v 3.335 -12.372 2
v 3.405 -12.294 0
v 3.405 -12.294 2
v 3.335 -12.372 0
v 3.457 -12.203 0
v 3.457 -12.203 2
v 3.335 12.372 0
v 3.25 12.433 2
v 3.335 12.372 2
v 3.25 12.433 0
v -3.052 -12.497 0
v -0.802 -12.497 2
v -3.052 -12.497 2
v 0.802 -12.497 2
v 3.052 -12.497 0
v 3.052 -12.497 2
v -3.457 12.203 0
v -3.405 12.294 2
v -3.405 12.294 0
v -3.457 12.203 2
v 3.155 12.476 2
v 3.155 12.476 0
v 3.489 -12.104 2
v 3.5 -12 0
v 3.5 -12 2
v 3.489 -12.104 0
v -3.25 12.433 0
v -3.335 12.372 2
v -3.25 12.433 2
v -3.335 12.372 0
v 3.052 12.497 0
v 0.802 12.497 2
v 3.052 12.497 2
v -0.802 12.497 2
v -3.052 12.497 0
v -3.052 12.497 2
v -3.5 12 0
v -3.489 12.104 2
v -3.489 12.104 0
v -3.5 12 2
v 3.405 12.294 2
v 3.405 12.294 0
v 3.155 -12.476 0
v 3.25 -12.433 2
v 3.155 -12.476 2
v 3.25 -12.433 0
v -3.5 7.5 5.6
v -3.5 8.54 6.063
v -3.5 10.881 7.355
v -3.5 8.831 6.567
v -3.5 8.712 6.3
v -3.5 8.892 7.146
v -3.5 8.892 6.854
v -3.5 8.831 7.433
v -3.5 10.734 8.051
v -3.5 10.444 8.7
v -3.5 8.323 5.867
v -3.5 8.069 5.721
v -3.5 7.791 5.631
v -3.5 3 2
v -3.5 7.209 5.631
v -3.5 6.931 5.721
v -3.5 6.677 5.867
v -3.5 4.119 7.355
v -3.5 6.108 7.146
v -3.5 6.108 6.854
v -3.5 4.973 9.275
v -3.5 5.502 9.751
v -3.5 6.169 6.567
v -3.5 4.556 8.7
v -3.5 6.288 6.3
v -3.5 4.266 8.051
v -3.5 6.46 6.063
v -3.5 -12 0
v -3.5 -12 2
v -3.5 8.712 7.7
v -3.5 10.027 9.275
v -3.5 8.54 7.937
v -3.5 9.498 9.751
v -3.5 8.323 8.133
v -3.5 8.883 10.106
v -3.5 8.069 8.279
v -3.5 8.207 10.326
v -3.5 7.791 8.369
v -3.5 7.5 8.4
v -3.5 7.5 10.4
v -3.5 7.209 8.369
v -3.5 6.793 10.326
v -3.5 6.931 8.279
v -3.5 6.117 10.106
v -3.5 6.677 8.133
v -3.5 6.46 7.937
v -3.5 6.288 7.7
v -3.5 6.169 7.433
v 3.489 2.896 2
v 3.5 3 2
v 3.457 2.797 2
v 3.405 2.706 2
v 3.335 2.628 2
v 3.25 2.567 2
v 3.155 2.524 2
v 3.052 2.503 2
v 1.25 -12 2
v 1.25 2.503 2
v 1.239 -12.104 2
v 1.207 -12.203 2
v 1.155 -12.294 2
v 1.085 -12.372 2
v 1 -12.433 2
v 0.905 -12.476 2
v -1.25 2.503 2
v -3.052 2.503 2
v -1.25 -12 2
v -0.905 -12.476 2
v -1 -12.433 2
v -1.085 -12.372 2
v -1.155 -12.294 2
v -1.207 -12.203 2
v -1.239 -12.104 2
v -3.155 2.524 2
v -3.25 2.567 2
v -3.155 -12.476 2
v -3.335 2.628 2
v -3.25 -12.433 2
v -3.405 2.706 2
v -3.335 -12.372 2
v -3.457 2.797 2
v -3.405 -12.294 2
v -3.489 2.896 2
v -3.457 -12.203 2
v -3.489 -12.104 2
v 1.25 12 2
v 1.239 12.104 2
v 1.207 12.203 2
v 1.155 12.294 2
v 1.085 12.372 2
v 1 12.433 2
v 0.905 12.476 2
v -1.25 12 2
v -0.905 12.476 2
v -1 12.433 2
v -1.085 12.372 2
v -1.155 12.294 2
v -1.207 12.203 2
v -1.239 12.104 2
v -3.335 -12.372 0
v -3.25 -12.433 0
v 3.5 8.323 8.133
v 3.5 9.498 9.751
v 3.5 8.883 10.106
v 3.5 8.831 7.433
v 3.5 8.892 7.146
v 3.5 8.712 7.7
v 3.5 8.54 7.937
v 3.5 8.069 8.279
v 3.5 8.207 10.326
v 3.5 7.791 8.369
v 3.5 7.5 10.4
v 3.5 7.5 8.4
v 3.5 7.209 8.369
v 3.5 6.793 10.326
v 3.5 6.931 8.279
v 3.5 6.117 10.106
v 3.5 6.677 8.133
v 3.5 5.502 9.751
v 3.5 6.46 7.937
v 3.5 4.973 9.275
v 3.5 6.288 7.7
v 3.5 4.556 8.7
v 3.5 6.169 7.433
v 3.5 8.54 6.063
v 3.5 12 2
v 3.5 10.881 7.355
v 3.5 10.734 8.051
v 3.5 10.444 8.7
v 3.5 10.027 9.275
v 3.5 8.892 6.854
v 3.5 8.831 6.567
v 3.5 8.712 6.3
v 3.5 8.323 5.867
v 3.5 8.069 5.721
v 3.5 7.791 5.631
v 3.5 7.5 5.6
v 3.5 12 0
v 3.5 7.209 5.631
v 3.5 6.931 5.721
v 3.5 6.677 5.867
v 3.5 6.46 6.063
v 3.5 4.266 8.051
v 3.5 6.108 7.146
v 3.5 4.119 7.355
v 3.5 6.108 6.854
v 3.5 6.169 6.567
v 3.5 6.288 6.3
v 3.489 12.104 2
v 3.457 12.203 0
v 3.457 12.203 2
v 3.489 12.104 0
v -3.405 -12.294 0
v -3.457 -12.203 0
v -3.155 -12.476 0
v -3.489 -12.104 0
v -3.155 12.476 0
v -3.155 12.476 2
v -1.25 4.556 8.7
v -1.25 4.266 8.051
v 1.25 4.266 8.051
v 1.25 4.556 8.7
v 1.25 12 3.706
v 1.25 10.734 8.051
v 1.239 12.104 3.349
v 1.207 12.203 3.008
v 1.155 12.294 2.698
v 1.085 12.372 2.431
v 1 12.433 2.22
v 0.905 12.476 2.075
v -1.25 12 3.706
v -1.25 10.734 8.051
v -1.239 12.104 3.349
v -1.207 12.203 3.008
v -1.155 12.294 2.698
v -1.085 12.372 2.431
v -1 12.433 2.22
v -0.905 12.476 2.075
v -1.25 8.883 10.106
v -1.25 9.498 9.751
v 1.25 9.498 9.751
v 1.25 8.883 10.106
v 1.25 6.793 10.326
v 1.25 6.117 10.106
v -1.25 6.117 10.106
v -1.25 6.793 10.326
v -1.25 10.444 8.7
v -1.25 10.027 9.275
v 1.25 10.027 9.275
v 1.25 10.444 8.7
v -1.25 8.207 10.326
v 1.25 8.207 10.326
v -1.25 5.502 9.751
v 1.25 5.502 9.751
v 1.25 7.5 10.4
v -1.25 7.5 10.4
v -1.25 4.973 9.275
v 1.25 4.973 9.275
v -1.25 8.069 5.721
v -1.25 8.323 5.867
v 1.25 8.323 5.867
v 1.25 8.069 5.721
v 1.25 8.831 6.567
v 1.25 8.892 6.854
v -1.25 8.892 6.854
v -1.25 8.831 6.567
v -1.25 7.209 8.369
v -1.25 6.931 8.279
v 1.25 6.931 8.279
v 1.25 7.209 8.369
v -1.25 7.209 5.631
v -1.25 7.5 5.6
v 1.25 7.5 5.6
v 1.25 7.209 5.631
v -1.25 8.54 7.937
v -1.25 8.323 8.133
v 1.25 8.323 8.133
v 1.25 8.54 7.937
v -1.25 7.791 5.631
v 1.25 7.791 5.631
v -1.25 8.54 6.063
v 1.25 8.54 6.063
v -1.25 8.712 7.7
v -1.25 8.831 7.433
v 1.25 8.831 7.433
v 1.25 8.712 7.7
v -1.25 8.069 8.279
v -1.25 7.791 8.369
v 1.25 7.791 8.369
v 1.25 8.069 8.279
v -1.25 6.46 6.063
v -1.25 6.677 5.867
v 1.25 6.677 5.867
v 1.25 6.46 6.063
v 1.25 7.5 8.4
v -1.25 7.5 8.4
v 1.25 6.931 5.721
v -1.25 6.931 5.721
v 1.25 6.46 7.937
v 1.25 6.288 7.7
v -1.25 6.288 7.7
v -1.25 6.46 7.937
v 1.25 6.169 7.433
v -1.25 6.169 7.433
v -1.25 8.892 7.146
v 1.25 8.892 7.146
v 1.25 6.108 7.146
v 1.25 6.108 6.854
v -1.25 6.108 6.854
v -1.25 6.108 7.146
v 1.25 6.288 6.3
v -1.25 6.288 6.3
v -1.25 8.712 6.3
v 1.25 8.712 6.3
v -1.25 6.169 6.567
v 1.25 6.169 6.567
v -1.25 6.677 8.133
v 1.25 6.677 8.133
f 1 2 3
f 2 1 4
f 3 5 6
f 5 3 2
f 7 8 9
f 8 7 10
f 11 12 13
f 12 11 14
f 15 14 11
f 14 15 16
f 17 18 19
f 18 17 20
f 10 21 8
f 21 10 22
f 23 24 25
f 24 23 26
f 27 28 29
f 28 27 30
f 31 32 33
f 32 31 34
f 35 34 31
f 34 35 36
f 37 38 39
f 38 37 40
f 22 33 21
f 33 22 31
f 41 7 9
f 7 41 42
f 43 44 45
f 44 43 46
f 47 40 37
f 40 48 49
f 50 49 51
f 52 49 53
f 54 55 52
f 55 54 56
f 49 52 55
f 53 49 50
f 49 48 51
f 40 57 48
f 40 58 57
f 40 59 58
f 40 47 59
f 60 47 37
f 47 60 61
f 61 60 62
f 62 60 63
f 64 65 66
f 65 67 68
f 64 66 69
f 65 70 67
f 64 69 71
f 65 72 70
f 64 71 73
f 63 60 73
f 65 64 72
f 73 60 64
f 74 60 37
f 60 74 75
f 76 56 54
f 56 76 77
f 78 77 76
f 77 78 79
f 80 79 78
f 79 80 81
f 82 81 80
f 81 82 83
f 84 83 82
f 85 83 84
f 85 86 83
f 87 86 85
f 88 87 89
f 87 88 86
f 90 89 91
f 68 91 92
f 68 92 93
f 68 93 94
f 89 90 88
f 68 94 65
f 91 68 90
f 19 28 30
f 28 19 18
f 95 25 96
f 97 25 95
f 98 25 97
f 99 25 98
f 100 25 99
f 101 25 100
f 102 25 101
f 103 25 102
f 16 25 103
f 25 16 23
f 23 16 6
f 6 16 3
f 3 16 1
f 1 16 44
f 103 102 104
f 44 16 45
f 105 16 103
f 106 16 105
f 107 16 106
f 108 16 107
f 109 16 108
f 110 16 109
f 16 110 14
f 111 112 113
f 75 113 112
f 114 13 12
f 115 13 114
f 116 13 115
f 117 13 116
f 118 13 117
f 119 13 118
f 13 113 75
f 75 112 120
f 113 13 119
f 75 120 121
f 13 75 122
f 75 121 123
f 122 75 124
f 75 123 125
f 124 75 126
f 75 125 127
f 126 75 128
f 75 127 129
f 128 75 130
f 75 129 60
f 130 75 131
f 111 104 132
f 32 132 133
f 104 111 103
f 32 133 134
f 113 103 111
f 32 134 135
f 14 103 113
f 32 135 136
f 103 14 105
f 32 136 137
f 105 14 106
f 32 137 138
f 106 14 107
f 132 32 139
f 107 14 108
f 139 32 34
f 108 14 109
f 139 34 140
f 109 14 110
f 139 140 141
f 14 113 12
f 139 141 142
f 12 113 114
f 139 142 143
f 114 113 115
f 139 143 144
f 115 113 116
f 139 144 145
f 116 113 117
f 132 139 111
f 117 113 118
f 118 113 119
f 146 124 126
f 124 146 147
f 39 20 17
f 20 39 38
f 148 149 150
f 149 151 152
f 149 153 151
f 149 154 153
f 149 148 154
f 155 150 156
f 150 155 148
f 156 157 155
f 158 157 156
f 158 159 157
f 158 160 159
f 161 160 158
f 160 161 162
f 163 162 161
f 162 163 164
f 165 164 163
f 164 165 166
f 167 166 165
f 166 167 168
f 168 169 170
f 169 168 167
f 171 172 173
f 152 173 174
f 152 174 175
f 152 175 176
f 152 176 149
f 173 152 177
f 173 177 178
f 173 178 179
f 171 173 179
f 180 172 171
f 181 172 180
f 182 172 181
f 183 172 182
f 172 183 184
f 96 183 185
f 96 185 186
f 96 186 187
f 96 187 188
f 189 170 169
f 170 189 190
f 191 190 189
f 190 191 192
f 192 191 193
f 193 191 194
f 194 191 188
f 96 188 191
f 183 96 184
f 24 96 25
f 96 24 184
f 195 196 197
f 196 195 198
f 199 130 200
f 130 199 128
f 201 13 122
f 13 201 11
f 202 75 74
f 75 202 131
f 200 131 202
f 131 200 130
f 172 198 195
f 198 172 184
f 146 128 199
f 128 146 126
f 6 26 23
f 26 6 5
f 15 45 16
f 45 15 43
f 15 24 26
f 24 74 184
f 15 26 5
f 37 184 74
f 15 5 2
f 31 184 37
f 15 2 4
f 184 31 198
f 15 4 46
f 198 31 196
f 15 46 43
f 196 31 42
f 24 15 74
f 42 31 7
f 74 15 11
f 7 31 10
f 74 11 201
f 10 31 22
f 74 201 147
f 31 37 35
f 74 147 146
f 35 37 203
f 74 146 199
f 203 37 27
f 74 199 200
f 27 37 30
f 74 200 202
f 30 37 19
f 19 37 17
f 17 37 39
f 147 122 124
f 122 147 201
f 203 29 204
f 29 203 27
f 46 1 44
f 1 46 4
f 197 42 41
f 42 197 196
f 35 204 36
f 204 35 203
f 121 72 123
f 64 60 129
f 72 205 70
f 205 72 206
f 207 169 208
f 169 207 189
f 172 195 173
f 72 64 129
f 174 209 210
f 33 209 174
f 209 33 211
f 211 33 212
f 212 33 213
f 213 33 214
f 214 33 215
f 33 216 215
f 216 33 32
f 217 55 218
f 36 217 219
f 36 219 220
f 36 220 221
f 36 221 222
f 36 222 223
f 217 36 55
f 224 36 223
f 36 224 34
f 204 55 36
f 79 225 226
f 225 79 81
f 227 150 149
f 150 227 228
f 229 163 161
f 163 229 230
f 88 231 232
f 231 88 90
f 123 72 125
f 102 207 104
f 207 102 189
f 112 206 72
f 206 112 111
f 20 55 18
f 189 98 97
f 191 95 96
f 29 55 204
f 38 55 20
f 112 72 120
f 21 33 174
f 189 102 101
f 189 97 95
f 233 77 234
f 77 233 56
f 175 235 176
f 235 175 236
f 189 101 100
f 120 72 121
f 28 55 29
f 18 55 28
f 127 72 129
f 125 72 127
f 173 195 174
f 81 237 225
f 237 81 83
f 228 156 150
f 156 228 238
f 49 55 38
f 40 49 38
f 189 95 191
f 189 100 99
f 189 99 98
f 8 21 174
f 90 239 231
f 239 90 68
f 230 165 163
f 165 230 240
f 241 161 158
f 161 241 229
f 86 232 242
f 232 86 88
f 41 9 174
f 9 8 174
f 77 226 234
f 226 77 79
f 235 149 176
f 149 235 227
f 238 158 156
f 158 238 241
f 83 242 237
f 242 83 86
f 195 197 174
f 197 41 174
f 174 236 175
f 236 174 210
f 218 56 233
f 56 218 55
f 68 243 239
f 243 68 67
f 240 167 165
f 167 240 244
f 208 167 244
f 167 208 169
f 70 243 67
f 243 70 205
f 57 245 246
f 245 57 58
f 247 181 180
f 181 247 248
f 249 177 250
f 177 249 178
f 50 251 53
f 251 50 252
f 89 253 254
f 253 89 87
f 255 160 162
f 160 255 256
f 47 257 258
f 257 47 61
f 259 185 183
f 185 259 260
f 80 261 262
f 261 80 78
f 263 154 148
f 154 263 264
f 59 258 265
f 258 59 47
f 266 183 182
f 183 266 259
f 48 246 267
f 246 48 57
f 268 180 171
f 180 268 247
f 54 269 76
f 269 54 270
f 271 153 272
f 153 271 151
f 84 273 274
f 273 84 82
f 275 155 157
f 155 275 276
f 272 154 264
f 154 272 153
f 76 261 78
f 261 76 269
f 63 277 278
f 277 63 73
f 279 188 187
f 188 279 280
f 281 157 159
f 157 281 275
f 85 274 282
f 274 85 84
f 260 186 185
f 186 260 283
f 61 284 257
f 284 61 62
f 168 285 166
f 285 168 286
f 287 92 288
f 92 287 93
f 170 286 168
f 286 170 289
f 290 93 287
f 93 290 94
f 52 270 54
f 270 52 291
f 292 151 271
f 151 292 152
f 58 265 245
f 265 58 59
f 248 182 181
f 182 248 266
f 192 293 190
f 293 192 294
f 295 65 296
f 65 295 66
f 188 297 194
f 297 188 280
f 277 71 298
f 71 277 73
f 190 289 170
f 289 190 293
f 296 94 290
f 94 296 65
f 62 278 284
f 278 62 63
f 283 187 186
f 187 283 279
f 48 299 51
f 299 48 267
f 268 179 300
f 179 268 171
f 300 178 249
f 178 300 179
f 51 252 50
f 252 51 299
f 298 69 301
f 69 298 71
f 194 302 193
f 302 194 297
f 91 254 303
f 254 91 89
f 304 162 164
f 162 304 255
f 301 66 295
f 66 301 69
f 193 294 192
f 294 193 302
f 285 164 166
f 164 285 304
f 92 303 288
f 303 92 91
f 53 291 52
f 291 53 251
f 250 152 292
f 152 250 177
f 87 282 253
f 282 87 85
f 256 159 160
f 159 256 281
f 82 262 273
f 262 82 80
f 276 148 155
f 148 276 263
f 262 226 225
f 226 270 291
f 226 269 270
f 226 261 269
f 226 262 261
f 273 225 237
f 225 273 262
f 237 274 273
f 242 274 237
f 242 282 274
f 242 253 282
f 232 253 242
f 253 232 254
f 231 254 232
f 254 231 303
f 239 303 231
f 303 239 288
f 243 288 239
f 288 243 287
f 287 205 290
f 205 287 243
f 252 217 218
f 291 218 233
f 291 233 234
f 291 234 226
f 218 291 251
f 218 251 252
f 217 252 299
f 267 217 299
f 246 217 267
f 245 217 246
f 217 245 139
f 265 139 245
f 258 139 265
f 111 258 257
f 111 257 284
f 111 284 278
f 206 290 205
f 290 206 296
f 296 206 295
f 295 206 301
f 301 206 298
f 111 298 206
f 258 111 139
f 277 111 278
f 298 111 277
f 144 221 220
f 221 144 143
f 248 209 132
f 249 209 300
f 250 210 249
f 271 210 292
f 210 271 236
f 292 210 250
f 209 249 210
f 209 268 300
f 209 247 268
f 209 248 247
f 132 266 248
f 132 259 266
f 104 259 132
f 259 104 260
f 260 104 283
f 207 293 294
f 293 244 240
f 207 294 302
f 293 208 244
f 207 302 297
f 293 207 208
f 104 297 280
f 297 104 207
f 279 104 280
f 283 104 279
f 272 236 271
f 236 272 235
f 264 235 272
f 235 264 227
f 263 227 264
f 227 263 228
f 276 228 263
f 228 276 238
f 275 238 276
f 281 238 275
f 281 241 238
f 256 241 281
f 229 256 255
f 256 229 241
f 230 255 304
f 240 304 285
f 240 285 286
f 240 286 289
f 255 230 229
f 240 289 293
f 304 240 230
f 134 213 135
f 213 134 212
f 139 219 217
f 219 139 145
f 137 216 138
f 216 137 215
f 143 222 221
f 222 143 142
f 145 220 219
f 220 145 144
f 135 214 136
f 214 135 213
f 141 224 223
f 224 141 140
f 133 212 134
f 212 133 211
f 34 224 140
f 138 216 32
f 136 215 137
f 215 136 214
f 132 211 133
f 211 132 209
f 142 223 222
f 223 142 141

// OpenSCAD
THICKNESS = 2;
WIDTH = 7;
LENGTH = 25;
CORNER_DIA = 1;

RAIL_THICKNESS = 2.5;

MOUNT_DIA = 2.8;
MOUNT_OFFSET = 5;
MOUNT_PLACEMENT = 0.80 * LENGTH;

$fn = 30;

module rounded_rect(width, length, height, corner_dia) {
  hull() {
    for(i = [-1, 1]) {
      for(j = [-1, 1]) {
        translate([i * (width - corner_dia)/2, j * (length - corner_dia)/2, 0])
        cylinder(d = corner_dia, h = height);
      }
    }
  }
}

module mount() {
  hull() {
    translate([0, 0, THICKNESS + MOUNT_OFFSET])
    rotate([0, 90, 0])
    cylinder(d = MOUNT_DIA + 2 * THICKNESS, h = WIDTH, center = true);
    rounded_rect(WIDTH, 2 * (LENGTH - MOUNT_PLACEMENT), THICKNESS, CORNER_DIA);
  }
}

module mount_hole() {
  #translate([0, 0, THICKNESS + MOUNT_OFFSET])
  rotate([0, 90, 0])
  cylinder(d = MOUNT_DIA, h = WIDTH, center = true);
}

module lever() {
  difference() {
    union() {
      rounded_rect(WIDTH, LENGTH, THICKNESS, CORNER_DIA);
      translate([0, MOUNT_PLACEMENT - LENGTH/2, 0])
      mount();
    }
    translate([0, MOUNT_PLACEMENT - LENGTH/2, ])
    mount_hole();
    
    translate([0, 0, THICKNESS])
    rounded_rect(RAIL_THICKNESS, LENGTH, 10, CORNER_DIA);
  }
}

lever();
